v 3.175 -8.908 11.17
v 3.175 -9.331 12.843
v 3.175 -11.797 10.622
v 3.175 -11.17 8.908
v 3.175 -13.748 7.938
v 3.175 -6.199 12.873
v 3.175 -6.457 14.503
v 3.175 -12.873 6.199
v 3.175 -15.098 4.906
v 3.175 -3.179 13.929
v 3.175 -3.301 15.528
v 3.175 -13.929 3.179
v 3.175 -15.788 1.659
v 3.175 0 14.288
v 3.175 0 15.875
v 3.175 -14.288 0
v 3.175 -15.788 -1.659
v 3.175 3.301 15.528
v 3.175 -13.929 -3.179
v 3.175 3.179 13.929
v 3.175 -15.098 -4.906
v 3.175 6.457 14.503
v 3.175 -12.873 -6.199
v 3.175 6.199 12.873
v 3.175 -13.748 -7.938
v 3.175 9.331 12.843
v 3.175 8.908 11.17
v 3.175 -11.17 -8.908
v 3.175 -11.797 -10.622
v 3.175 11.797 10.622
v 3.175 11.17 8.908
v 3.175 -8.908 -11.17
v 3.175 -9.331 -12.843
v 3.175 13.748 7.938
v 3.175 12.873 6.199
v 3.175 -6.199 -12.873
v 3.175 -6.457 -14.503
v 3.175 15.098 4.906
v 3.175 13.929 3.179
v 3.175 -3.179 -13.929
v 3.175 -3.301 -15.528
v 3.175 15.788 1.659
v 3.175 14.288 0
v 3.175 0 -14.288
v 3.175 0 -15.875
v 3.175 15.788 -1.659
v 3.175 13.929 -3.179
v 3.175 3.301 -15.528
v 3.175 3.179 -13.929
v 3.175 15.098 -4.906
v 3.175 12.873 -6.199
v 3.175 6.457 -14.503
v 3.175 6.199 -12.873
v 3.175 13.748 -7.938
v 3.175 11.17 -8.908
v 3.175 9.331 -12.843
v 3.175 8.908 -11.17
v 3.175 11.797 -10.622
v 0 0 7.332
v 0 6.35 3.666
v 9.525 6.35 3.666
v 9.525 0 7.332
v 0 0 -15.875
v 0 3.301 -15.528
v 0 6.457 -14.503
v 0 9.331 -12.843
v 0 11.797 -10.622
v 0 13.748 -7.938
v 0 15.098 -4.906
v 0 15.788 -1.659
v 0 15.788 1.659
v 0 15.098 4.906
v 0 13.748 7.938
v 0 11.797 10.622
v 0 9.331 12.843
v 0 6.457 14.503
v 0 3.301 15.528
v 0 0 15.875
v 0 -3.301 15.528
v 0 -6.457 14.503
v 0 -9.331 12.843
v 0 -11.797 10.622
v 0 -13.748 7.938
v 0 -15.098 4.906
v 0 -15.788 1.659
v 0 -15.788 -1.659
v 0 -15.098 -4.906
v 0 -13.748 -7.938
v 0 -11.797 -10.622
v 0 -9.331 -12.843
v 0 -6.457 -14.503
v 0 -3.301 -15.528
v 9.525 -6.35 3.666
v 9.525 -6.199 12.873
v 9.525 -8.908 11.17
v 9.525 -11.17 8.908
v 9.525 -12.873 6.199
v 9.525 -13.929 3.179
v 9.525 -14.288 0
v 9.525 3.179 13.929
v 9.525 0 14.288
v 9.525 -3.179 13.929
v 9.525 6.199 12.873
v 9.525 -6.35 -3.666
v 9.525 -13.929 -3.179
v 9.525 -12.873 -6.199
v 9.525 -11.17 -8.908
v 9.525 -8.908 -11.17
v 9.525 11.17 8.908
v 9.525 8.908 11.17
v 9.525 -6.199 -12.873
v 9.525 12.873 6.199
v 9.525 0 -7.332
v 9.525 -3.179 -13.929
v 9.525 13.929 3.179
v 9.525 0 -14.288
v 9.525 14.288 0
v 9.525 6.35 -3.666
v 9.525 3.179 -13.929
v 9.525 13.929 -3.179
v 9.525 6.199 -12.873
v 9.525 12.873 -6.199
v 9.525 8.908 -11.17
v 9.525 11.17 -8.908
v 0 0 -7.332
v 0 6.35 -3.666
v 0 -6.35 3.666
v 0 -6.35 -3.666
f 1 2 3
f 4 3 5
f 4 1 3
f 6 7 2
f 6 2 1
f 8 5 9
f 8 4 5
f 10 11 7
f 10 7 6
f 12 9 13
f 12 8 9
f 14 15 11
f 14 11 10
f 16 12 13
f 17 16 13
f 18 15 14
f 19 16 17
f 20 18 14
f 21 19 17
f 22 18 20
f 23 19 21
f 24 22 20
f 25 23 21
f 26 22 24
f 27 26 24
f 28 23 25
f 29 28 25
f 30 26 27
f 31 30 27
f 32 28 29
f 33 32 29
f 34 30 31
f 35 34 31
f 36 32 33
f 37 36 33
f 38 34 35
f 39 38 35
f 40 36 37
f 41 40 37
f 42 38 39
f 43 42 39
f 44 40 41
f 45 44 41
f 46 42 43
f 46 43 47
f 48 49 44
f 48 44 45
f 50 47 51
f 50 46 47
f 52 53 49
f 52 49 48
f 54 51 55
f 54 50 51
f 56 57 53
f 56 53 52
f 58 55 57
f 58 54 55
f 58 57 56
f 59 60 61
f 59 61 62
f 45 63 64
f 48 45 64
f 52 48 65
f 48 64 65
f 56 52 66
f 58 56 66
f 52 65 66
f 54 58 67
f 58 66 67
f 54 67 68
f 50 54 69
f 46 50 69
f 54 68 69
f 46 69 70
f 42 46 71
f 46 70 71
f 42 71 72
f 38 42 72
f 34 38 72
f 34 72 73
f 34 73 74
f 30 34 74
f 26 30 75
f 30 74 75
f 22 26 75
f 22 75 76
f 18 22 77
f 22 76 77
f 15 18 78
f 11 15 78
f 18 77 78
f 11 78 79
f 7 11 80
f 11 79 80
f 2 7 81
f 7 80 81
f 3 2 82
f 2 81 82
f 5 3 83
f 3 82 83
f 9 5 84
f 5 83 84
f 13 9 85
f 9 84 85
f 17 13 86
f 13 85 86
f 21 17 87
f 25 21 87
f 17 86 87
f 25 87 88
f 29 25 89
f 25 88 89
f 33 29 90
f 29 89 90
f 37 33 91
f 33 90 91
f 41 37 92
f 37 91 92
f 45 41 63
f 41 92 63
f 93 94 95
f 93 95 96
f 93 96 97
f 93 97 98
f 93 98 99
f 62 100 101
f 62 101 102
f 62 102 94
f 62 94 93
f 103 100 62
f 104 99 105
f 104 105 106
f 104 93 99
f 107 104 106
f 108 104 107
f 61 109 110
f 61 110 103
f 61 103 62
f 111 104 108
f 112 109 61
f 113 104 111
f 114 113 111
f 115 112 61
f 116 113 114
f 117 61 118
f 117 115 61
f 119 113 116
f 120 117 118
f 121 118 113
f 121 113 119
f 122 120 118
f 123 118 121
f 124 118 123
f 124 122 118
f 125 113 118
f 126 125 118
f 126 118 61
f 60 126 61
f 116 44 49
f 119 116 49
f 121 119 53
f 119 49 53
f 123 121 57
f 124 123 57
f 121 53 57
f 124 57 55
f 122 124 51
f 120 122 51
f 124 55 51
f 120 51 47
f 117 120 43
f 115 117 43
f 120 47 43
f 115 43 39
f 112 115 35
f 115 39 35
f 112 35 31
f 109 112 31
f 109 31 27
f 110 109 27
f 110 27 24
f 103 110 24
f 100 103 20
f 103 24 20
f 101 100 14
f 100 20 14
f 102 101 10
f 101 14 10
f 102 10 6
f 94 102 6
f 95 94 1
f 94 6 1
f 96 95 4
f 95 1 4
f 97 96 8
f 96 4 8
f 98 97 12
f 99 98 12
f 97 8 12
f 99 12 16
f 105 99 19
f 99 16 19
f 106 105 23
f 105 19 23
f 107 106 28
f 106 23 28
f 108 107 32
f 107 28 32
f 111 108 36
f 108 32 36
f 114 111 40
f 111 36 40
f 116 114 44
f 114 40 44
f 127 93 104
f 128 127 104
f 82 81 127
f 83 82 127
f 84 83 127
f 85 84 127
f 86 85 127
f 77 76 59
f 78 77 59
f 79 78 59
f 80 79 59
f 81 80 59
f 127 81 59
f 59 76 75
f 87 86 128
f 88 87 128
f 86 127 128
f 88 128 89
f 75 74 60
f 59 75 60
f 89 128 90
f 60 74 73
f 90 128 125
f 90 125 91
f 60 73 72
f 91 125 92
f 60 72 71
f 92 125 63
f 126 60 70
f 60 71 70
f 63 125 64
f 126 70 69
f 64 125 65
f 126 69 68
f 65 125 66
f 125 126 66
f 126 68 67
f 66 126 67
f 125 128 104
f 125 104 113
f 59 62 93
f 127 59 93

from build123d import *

# Parameters (mm, degrees)
SKETCH1_R           = 15.875
BOSS_EXTRUDE1_DEPTH = 3.175
SKETCH2_R           = 14.2875
BOSS_EXTRUDE2_DEPTH = 6.35
CUT_EXTRUDE1_DEPTH  = 10.525


with BuildPart() as part:
    # Sketch1 → Boss-Extrude1 (new body)
    with BuildSketch(Plane(origin=(0, 0, 0), x_dir=(0, 0, -1), z_dir=(1, 0, 0))):
        Circle(SKETCH1_R)
    extrude(amount=BOSS_EXTRUDE1_DEPTH)

    # Sketch2 → Boss-Extrude2 (add)
    with BuildSketch(Plane(origin=(3.175, 0, 0), x_dir=(0, 0, -1), z_dir=(1, 0, 0))):
        Circle(SKETCH2_R)
    extrude(amount=BOSS_EXTRUDE2_DEPTH)

    # Sketch3 → Cut-Extrude1 (cut, through all)
    with BuildSketch(Plane(origin=(9.525, 0, 0), x_dir=(0, 0, -1), z_dir=(1, 0, 0))):
        Polygon((7.332348419, 0), (3.666174209, 6.35), (-3.666174209, 6.35), (-7.332348419, 0), (-3.666174209, -6.35), (3.666174209, -6.35), align=None)
    extrude(amount=-CUT_EXTRUDE1_DEPTH, mode=Mode.SUBTRACT)


solid = part.part
